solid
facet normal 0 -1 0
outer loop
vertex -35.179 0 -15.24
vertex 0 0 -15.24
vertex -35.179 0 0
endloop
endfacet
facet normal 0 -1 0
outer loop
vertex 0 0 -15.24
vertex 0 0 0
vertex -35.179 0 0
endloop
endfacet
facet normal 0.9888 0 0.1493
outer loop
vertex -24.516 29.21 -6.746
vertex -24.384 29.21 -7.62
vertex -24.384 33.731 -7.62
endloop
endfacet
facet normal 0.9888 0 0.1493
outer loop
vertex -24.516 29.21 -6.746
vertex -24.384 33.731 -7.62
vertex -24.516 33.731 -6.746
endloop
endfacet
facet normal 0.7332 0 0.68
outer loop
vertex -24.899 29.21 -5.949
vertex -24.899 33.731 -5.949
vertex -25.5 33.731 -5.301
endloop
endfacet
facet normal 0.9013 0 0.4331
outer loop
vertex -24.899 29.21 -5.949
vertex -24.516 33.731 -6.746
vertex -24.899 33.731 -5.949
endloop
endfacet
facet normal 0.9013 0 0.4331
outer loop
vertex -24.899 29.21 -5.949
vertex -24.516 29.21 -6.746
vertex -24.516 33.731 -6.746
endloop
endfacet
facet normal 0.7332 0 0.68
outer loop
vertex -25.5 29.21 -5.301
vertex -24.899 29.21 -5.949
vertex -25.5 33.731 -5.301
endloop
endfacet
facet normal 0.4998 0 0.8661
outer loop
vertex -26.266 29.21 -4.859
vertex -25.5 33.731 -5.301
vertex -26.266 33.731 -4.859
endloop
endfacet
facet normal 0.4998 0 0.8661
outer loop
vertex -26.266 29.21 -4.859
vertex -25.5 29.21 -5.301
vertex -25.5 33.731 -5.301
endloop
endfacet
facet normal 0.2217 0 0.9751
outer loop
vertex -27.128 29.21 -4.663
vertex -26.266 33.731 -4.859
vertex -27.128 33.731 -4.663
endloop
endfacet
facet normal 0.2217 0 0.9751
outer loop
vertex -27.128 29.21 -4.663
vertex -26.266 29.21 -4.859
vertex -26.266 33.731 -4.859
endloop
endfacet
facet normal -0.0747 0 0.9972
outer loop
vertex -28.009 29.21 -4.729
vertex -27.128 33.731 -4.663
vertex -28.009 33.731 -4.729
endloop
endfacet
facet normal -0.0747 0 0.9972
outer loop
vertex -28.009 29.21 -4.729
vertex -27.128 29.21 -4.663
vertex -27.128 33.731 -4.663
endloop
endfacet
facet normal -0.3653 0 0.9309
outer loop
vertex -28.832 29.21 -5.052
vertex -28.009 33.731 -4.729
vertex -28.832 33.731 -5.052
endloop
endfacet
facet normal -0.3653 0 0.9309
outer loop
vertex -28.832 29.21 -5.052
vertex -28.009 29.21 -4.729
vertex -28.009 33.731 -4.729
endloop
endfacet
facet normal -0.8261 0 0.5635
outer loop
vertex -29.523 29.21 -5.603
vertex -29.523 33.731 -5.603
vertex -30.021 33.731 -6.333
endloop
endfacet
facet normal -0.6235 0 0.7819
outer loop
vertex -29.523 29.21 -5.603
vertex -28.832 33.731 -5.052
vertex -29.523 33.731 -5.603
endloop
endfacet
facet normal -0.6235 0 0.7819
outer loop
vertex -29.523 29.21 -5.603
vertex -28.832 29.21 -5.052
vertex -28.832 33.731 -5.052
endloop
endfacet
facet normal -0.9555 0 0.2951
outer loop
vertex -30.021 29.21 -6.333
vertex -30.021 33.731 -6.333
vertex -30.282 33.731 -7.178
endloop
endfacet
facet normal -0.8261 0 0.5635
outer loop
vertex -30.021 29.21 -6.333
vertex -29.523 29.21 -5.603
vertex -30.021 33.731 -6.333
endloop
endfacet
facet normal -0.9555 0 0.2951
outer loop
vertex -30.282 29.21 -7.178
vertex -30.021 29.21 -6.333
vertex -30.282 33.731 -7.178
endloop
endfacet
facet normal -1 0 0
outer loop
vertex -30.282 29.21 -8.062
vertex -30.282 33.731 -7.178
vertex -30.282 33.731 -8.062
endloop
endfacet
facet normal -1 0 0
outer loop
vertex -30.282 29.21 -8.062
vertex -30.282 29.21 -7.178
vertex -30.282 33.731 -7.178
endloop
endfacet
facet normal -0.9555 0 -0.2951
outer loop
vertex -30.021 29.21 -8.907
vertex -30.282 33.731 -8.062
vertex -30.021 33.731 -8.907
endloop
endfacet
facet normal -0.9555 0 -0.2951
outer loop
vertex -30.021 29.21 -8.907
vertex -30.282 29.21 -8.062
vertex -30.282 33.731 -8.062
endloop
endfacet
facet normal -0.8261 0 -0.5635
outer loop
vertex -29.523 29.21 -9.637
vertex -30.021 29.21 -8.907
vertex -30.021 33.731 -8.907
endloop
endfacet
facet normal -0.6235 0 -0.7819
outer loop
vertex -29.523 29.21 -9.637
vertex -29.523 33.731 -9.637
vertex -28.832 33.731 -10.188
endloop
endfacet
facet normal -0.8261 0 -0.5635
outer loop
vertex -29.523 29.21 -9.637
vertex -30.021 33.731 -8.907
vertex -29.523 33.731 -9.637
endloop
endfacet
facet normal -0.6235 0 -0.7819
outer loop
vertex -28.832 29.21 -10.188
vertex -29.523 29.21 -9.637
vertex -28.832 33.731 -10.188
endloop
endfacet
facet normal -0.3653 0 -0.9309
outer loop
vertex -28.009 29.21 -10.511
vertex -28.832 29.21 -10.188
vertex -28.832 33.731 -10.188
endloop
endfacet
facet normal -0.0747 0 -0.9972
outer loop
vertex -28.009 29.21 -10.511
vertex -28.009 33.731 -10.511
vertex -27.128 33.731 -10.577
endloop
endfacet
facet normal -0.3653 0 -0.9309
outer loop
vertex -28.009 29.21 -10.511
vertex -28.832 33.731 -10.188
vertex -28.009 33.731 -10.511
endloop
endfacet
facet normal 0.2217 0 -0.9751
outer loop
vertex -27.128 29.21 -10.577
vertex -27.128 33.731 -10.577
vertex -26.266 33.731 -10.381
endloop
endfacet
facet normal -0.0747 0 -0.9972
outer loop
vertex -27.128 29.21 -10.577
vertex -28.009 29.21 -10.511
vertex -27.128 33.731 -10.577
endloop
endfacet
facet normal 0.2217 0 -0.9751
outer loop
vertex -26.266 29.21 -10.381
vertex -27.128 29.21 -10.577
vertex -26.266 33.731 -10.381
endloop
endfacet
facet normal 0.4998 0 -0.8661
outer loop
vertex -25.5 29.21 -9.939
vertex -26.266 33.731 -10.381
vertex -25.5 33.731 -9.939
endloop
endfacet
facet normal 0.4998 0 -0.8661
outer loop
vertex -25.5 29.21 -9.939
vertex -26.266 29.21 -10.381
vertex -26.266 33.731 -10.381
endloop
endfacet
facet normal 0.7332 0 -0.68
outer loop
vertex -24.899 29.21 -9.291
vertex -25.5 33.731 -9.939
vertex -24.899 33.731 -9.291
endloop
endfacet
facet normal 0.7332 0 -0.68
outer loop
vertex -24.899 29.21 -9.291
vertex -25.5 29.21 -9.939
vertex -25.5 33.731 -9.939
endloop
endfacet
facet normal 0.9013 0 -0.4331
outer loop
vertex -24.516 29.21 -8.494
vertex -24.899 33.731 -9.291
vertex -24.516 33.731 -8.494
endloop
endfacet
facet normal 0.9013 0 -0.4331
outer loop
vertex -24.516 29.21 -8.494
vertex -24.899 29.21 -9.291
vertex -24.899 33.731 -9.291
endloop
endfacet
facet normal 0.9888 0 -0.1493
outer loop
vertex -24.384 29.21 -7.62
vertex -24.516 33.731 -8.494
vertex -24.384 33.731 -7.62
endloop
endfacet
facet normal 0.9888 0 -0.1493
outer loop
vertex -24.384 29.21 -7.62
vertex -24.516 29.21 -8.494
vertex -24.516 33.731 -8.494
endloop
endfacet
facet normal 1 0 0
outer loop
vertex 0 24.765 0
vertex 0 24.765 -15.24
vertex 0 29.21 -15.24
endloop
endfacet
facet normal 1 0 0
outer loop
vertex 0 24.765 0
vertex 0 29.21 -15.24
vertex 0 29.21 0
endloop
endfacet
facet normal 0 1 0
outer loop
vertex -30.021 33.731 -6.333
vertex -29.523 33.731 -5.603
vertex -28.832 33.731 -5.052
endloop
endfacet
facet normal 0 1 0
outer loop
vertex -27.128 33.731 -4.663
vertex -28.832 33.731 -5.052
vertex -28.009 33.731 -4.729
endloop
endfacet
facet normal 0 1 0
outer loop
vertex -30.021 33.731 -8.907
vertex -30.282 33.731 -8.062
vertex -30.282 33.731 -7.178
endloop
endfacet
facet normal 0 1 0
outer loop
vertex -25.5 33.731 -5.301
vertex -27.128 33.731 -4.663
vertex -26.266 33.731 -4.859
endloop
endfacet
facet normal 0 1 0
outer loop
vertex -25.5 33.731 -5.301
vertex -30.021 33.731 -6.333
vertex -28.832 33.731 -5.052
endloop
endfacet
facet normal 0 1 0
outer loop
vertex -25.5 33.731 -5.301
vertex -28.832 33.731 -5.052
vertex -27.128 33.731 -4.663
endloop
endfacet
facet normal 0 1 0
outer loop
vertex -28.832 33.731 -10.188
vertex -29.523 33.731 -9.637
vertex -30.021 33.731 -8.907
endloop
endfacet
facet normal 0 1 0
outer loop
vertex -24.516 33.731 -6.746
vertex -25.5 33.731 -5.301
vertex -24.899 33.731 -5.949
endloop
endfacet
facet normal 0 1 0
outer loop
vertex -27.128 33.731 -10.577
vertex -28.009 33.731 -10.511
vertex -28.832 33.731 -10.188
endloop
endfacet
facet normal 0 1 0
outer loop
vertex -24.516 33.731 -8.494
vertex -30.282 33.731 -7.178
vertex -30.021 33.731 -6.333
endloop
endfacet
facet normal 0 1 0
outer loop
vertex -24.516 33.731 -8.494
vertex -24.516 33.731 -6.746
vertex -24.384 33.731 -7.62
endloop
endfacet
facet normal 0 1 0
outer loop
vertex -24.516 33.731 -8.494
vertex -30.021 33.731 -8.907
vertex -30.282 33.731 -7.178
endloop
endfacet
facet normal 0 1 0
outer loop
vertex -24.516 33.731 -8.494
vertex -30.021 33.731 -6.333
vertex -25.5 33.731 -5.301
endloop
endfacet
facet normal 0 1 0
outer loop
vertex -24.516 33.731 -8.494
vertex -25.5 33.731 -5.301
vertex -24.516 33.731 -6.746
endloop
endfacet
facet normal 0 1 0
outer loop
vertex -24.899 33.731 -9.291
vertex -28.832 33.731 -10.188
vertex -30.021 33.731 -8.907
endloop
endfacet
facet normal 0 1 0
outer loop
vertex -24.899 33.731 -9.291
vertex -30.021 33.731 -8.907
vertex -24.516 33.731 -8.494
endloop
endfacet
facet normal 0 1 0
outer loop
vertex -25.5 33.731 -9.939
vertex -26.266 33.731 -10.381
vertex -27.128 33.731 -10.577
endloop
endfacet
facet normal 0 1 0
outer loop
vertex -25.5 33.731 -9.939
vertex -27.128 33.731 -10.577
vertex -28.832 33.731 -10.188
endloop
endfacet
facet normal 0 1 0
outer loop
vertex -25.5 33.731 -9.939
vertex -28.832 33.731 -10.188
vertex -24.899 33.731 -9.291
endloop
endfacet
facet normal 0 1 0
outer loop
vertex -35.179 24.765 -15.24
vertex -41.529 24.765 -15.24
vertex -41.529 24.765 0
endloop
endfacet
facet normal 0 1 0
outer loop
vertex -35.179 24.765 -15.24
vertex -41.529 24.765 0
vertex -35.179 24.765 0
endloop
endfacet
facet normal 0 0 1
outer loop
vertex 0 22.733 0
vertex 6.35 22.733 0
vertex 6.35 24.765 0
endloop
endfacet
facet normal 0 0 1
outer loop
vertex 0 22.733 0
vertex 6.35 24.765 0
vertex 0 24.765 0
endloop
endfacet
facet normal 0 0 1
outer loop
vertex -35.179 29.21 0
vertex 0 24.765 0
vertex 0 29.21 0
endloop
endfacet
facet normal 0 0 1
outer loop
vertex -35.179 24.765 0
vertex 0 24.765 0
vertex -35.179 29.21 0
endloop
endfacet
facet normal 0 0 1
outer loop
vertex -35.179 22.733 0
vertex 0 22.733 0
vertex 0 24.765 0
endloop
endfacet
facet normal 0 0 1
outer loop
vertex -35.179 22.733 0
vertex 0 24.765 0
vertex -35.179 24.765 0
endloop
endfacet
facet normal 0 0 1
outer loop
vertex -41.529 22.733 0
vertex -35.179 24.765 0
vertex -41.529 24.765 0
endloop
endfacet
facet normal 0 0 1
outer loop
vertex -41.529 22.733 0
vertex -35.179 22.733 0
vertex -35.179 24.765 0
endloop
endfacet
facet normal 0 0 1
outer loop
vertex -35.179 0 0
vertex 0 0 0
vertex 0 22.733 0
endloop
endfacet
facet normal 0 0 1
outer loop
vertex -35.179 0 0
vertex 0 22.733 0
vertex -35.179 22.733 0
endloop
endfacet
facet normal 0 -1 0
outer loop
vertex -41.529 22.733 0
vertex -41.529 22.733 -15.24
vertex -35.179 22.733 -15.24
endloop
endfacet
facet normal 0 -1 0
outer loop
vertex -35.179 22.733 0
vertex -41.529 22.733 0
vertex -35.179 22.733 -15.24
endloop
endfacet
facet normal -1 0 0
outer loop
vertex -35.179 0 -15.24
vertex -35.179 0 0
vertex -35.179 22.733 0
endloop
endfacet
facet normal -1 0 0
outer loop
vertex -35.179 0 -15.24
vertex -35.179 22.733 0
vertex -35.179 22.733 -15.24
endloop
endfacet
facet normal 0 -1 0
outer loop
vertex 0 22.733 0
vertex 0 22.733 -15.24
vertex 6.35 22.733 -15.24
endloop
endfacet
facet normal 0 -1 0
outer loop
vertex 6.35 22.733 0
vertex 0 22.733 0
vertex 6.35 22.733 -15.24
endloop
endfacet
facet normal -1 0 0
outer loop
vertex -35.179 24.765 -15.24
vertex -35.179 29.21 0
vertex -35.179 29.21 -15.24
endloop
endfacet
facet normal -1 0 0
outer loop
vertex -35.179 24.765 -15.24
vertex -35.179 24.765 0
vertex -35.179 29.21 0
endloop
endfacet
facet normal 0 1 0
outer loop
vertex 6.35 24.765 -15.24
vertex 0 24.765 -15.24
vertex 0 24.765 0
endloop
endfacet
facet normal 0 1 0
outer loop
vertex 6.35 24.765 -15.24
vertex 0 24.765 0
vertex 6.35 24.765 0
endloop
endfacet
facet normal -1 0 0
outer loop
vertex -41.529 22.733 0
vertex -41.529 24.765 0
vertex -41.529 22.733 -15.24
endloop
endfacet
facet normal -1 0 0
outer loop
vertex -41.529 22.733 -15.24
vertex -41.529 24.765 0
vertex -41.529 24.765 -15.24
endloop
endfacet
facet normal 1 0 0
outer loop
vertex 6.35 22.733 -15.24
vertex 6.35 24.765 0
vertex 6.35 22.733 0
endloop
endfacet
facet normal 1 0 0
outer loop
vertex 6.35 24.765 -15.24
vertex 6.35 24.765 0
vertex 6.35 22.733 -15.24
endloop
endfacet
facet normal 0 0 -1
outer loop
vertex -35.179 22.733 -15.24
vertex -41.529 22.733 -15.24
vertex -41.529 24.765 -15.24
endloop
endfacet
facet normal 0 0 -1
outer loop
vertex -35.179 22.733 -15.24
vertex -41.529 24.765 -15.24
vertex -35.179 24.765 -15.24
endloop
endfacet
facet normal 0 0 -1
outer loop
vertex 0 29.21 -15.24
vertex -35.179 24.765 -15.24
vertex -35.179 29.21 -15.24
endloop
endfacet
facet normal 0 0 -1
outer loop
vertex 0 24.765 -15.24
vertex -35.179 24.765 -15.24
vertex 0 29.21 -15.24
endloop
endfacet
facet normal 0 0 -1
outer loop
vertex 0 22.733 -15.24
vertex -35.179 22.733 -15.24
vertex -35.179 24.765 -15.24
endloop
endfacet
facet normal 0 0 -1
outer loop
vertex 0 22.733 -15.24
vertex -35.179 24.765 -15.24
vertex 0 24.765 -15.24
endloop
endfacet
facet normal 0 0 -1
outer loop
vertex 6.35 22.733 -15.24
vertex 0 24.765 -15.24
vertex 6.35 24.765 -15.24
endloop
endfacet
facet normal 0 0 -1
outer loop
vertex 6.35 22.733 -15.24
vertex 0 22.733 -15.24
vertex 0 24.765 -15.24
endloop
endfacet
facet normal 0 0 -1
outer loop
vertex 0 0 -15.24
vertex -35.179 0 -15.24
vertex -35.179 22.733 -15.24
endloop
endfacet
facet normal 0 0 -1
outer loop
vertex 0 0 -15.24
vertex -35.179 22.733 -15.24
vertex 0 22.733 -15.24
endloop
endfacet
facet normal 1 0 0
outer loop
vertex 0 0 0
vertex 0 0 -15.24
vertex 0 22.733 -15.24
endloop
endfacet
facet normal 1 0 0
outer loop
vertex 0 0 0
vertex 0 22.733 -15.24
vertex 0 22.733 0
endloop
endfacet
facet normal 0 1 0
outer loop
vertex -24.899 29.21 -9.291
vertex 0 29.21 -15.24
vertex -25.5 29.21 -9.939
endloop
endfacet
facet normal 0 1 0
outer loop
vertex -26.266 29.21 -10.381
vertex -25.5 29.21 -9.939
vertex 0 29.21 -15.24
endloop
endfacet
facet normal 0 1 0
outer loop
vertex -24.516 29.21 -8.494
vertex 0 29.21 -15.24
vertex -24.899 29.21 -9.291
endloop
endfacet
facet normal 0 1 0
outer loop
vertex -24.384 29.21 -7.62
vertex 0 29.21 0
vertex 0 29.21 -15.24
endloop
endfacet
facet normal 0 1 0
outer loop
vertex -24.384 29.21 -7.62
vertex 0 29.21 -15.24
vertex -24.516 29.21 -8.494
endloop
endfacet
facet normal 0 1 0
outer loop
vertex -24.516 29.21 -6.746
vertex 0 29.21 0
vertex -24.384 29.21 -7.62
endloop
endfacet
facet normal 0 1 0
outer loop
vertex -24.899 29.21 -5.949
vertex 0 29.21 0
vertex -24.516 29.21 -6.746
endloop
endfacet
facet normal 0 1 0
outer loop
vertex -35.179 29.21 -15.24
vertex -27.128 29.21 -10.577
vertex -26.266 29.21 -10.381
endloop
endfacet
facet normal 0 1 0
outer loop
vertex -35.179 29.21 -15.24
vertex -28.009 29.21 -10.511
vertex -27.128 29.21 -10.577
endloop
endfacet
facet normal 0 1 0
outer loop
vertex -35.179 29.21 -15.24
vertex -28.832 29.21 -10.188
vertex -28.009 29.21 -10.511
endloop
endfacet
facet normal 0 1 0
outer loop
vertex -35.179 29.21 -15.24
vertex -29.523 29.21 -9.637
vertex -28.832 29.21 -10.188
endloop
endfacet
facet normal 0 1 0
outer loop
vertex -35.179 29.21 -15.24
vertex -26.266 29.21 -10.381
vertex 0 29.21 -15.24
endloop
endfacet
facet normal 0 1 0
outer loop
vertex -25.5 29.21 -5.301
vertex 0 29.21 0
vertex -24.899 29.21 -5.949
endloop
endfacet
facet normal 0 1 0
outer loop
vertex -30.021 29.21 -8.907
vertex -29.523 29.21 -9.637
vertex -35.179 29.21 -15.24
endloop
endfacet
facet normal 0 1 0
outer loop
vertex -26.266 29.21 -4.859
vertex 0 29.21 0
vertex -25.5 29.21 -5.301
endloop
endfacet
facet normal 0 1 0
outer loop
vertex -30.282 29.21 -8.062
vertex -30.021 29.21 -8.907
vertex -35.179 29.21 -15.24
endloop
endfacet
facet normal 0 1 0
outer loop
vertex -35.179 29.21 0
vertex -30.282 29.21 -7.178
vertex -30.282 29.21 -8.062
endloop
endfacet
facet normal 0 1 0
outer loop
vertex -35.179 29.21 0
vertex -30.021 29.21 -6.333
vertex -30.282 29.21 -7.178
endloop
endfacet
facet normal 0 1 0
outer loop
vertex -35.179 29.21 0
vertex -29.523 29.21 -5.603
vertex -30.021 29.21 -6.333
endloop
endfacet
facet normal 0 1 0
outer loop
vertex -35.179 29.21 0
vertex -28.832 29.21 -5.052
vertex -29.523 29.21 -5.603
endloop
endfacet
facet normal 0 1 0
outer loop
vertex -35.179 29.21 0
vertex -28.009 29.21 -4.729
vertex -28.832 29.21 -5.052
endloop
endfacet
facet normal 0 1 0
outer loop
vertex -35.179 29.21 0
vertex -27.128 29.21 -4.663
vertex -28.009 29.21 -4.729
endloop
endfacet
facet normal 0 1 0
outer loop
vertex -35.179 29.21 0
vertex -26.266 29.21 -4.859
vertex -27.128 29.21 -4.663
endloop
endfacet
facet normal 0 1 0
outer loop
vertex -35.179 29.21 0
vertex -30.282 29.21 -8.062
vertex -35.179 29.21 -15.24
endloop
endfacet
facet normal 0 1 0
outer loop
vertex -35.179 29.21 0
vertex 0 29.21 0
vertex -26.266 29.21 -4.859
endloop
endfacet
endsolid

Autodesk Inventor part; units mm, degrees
ref_plane "YZ Plane" through (0, 0, 0) normal (1, 0, 0) x (0, 1, 0)
ref_plane "XZ Plane" through (0, 0, 0) normal (0, 1, 0) x (-1, 0, 0)
ref_plane "XY Plane" through (0, 0, 0) normal (0, 0, 1) x (1, 0, 0)
sketch "Sketch1" plane through (0, 0, 0) normal (0, 1, 0) x (-1, 0, 0)
  line L0 (0, 0) -> (35.179, 0)
  line L1 (35.179, 0) -> (35.179, -15.24)
  line L2 (35.179, -15.24) -> (0, -15.24)
  line L3 (0, -15.24) -> (0, 0)
  dimension "d0" = 35.179
  dimension "d1" = 15.24
extrude "Extrusion1" add sketch "Sketch1" along normal blind 29.21
ref_plane "Work Plane1" through (0, 24.765, 0) normal (0, 1, 0) x (1, 0, 0)
sketch "Sketch2" plane through (0, 24.765, 0) normal (0, 1, 0) x (1, 0, 0)
  line L0 (0, 0) -> (6.35, 0)
  line L1 (6.35, 0) -> (6.35, 15.24)
  line L2 (6.35, 15.24) -> (0, 15.24)
  line L3 (0, 15.24) -> (0, 0)
  line L4 (-35.179, 0) -> (0, 0) projected
  line L5 (-35.179, 0) -> (-41.529, 0)
  line L6 (-41.529, 0) -> (-41.529, 15.24)
  line L7 (-41.529, 15.24) -> (-35.179, 15.24)
  line L8 (-35.179, 15.24) -> (-35.179, 0)
  dimension "d5" = 6.35
  dimension "d6" = 6.35
extrude "Extrusion2" add sketch "Sketch2" against normal blind 2.032
sketch "Sketch3" plane through (0, 29.21, 0) normal (0, 1, 0) x (1, 0, 0)
  circle A0 centre (-27.3494, 7.62) radius 2.9655
  point P0 (0, 0)
  point P1 (-41.529, 0)
  point P2 (-41.529, 15.24)
  dimension "d10" = 5.9309
extrude "Extrusion3" add sketch "Sketch3" along normal blind 4.5212
properties part number "AssaultReaper500Servo"
